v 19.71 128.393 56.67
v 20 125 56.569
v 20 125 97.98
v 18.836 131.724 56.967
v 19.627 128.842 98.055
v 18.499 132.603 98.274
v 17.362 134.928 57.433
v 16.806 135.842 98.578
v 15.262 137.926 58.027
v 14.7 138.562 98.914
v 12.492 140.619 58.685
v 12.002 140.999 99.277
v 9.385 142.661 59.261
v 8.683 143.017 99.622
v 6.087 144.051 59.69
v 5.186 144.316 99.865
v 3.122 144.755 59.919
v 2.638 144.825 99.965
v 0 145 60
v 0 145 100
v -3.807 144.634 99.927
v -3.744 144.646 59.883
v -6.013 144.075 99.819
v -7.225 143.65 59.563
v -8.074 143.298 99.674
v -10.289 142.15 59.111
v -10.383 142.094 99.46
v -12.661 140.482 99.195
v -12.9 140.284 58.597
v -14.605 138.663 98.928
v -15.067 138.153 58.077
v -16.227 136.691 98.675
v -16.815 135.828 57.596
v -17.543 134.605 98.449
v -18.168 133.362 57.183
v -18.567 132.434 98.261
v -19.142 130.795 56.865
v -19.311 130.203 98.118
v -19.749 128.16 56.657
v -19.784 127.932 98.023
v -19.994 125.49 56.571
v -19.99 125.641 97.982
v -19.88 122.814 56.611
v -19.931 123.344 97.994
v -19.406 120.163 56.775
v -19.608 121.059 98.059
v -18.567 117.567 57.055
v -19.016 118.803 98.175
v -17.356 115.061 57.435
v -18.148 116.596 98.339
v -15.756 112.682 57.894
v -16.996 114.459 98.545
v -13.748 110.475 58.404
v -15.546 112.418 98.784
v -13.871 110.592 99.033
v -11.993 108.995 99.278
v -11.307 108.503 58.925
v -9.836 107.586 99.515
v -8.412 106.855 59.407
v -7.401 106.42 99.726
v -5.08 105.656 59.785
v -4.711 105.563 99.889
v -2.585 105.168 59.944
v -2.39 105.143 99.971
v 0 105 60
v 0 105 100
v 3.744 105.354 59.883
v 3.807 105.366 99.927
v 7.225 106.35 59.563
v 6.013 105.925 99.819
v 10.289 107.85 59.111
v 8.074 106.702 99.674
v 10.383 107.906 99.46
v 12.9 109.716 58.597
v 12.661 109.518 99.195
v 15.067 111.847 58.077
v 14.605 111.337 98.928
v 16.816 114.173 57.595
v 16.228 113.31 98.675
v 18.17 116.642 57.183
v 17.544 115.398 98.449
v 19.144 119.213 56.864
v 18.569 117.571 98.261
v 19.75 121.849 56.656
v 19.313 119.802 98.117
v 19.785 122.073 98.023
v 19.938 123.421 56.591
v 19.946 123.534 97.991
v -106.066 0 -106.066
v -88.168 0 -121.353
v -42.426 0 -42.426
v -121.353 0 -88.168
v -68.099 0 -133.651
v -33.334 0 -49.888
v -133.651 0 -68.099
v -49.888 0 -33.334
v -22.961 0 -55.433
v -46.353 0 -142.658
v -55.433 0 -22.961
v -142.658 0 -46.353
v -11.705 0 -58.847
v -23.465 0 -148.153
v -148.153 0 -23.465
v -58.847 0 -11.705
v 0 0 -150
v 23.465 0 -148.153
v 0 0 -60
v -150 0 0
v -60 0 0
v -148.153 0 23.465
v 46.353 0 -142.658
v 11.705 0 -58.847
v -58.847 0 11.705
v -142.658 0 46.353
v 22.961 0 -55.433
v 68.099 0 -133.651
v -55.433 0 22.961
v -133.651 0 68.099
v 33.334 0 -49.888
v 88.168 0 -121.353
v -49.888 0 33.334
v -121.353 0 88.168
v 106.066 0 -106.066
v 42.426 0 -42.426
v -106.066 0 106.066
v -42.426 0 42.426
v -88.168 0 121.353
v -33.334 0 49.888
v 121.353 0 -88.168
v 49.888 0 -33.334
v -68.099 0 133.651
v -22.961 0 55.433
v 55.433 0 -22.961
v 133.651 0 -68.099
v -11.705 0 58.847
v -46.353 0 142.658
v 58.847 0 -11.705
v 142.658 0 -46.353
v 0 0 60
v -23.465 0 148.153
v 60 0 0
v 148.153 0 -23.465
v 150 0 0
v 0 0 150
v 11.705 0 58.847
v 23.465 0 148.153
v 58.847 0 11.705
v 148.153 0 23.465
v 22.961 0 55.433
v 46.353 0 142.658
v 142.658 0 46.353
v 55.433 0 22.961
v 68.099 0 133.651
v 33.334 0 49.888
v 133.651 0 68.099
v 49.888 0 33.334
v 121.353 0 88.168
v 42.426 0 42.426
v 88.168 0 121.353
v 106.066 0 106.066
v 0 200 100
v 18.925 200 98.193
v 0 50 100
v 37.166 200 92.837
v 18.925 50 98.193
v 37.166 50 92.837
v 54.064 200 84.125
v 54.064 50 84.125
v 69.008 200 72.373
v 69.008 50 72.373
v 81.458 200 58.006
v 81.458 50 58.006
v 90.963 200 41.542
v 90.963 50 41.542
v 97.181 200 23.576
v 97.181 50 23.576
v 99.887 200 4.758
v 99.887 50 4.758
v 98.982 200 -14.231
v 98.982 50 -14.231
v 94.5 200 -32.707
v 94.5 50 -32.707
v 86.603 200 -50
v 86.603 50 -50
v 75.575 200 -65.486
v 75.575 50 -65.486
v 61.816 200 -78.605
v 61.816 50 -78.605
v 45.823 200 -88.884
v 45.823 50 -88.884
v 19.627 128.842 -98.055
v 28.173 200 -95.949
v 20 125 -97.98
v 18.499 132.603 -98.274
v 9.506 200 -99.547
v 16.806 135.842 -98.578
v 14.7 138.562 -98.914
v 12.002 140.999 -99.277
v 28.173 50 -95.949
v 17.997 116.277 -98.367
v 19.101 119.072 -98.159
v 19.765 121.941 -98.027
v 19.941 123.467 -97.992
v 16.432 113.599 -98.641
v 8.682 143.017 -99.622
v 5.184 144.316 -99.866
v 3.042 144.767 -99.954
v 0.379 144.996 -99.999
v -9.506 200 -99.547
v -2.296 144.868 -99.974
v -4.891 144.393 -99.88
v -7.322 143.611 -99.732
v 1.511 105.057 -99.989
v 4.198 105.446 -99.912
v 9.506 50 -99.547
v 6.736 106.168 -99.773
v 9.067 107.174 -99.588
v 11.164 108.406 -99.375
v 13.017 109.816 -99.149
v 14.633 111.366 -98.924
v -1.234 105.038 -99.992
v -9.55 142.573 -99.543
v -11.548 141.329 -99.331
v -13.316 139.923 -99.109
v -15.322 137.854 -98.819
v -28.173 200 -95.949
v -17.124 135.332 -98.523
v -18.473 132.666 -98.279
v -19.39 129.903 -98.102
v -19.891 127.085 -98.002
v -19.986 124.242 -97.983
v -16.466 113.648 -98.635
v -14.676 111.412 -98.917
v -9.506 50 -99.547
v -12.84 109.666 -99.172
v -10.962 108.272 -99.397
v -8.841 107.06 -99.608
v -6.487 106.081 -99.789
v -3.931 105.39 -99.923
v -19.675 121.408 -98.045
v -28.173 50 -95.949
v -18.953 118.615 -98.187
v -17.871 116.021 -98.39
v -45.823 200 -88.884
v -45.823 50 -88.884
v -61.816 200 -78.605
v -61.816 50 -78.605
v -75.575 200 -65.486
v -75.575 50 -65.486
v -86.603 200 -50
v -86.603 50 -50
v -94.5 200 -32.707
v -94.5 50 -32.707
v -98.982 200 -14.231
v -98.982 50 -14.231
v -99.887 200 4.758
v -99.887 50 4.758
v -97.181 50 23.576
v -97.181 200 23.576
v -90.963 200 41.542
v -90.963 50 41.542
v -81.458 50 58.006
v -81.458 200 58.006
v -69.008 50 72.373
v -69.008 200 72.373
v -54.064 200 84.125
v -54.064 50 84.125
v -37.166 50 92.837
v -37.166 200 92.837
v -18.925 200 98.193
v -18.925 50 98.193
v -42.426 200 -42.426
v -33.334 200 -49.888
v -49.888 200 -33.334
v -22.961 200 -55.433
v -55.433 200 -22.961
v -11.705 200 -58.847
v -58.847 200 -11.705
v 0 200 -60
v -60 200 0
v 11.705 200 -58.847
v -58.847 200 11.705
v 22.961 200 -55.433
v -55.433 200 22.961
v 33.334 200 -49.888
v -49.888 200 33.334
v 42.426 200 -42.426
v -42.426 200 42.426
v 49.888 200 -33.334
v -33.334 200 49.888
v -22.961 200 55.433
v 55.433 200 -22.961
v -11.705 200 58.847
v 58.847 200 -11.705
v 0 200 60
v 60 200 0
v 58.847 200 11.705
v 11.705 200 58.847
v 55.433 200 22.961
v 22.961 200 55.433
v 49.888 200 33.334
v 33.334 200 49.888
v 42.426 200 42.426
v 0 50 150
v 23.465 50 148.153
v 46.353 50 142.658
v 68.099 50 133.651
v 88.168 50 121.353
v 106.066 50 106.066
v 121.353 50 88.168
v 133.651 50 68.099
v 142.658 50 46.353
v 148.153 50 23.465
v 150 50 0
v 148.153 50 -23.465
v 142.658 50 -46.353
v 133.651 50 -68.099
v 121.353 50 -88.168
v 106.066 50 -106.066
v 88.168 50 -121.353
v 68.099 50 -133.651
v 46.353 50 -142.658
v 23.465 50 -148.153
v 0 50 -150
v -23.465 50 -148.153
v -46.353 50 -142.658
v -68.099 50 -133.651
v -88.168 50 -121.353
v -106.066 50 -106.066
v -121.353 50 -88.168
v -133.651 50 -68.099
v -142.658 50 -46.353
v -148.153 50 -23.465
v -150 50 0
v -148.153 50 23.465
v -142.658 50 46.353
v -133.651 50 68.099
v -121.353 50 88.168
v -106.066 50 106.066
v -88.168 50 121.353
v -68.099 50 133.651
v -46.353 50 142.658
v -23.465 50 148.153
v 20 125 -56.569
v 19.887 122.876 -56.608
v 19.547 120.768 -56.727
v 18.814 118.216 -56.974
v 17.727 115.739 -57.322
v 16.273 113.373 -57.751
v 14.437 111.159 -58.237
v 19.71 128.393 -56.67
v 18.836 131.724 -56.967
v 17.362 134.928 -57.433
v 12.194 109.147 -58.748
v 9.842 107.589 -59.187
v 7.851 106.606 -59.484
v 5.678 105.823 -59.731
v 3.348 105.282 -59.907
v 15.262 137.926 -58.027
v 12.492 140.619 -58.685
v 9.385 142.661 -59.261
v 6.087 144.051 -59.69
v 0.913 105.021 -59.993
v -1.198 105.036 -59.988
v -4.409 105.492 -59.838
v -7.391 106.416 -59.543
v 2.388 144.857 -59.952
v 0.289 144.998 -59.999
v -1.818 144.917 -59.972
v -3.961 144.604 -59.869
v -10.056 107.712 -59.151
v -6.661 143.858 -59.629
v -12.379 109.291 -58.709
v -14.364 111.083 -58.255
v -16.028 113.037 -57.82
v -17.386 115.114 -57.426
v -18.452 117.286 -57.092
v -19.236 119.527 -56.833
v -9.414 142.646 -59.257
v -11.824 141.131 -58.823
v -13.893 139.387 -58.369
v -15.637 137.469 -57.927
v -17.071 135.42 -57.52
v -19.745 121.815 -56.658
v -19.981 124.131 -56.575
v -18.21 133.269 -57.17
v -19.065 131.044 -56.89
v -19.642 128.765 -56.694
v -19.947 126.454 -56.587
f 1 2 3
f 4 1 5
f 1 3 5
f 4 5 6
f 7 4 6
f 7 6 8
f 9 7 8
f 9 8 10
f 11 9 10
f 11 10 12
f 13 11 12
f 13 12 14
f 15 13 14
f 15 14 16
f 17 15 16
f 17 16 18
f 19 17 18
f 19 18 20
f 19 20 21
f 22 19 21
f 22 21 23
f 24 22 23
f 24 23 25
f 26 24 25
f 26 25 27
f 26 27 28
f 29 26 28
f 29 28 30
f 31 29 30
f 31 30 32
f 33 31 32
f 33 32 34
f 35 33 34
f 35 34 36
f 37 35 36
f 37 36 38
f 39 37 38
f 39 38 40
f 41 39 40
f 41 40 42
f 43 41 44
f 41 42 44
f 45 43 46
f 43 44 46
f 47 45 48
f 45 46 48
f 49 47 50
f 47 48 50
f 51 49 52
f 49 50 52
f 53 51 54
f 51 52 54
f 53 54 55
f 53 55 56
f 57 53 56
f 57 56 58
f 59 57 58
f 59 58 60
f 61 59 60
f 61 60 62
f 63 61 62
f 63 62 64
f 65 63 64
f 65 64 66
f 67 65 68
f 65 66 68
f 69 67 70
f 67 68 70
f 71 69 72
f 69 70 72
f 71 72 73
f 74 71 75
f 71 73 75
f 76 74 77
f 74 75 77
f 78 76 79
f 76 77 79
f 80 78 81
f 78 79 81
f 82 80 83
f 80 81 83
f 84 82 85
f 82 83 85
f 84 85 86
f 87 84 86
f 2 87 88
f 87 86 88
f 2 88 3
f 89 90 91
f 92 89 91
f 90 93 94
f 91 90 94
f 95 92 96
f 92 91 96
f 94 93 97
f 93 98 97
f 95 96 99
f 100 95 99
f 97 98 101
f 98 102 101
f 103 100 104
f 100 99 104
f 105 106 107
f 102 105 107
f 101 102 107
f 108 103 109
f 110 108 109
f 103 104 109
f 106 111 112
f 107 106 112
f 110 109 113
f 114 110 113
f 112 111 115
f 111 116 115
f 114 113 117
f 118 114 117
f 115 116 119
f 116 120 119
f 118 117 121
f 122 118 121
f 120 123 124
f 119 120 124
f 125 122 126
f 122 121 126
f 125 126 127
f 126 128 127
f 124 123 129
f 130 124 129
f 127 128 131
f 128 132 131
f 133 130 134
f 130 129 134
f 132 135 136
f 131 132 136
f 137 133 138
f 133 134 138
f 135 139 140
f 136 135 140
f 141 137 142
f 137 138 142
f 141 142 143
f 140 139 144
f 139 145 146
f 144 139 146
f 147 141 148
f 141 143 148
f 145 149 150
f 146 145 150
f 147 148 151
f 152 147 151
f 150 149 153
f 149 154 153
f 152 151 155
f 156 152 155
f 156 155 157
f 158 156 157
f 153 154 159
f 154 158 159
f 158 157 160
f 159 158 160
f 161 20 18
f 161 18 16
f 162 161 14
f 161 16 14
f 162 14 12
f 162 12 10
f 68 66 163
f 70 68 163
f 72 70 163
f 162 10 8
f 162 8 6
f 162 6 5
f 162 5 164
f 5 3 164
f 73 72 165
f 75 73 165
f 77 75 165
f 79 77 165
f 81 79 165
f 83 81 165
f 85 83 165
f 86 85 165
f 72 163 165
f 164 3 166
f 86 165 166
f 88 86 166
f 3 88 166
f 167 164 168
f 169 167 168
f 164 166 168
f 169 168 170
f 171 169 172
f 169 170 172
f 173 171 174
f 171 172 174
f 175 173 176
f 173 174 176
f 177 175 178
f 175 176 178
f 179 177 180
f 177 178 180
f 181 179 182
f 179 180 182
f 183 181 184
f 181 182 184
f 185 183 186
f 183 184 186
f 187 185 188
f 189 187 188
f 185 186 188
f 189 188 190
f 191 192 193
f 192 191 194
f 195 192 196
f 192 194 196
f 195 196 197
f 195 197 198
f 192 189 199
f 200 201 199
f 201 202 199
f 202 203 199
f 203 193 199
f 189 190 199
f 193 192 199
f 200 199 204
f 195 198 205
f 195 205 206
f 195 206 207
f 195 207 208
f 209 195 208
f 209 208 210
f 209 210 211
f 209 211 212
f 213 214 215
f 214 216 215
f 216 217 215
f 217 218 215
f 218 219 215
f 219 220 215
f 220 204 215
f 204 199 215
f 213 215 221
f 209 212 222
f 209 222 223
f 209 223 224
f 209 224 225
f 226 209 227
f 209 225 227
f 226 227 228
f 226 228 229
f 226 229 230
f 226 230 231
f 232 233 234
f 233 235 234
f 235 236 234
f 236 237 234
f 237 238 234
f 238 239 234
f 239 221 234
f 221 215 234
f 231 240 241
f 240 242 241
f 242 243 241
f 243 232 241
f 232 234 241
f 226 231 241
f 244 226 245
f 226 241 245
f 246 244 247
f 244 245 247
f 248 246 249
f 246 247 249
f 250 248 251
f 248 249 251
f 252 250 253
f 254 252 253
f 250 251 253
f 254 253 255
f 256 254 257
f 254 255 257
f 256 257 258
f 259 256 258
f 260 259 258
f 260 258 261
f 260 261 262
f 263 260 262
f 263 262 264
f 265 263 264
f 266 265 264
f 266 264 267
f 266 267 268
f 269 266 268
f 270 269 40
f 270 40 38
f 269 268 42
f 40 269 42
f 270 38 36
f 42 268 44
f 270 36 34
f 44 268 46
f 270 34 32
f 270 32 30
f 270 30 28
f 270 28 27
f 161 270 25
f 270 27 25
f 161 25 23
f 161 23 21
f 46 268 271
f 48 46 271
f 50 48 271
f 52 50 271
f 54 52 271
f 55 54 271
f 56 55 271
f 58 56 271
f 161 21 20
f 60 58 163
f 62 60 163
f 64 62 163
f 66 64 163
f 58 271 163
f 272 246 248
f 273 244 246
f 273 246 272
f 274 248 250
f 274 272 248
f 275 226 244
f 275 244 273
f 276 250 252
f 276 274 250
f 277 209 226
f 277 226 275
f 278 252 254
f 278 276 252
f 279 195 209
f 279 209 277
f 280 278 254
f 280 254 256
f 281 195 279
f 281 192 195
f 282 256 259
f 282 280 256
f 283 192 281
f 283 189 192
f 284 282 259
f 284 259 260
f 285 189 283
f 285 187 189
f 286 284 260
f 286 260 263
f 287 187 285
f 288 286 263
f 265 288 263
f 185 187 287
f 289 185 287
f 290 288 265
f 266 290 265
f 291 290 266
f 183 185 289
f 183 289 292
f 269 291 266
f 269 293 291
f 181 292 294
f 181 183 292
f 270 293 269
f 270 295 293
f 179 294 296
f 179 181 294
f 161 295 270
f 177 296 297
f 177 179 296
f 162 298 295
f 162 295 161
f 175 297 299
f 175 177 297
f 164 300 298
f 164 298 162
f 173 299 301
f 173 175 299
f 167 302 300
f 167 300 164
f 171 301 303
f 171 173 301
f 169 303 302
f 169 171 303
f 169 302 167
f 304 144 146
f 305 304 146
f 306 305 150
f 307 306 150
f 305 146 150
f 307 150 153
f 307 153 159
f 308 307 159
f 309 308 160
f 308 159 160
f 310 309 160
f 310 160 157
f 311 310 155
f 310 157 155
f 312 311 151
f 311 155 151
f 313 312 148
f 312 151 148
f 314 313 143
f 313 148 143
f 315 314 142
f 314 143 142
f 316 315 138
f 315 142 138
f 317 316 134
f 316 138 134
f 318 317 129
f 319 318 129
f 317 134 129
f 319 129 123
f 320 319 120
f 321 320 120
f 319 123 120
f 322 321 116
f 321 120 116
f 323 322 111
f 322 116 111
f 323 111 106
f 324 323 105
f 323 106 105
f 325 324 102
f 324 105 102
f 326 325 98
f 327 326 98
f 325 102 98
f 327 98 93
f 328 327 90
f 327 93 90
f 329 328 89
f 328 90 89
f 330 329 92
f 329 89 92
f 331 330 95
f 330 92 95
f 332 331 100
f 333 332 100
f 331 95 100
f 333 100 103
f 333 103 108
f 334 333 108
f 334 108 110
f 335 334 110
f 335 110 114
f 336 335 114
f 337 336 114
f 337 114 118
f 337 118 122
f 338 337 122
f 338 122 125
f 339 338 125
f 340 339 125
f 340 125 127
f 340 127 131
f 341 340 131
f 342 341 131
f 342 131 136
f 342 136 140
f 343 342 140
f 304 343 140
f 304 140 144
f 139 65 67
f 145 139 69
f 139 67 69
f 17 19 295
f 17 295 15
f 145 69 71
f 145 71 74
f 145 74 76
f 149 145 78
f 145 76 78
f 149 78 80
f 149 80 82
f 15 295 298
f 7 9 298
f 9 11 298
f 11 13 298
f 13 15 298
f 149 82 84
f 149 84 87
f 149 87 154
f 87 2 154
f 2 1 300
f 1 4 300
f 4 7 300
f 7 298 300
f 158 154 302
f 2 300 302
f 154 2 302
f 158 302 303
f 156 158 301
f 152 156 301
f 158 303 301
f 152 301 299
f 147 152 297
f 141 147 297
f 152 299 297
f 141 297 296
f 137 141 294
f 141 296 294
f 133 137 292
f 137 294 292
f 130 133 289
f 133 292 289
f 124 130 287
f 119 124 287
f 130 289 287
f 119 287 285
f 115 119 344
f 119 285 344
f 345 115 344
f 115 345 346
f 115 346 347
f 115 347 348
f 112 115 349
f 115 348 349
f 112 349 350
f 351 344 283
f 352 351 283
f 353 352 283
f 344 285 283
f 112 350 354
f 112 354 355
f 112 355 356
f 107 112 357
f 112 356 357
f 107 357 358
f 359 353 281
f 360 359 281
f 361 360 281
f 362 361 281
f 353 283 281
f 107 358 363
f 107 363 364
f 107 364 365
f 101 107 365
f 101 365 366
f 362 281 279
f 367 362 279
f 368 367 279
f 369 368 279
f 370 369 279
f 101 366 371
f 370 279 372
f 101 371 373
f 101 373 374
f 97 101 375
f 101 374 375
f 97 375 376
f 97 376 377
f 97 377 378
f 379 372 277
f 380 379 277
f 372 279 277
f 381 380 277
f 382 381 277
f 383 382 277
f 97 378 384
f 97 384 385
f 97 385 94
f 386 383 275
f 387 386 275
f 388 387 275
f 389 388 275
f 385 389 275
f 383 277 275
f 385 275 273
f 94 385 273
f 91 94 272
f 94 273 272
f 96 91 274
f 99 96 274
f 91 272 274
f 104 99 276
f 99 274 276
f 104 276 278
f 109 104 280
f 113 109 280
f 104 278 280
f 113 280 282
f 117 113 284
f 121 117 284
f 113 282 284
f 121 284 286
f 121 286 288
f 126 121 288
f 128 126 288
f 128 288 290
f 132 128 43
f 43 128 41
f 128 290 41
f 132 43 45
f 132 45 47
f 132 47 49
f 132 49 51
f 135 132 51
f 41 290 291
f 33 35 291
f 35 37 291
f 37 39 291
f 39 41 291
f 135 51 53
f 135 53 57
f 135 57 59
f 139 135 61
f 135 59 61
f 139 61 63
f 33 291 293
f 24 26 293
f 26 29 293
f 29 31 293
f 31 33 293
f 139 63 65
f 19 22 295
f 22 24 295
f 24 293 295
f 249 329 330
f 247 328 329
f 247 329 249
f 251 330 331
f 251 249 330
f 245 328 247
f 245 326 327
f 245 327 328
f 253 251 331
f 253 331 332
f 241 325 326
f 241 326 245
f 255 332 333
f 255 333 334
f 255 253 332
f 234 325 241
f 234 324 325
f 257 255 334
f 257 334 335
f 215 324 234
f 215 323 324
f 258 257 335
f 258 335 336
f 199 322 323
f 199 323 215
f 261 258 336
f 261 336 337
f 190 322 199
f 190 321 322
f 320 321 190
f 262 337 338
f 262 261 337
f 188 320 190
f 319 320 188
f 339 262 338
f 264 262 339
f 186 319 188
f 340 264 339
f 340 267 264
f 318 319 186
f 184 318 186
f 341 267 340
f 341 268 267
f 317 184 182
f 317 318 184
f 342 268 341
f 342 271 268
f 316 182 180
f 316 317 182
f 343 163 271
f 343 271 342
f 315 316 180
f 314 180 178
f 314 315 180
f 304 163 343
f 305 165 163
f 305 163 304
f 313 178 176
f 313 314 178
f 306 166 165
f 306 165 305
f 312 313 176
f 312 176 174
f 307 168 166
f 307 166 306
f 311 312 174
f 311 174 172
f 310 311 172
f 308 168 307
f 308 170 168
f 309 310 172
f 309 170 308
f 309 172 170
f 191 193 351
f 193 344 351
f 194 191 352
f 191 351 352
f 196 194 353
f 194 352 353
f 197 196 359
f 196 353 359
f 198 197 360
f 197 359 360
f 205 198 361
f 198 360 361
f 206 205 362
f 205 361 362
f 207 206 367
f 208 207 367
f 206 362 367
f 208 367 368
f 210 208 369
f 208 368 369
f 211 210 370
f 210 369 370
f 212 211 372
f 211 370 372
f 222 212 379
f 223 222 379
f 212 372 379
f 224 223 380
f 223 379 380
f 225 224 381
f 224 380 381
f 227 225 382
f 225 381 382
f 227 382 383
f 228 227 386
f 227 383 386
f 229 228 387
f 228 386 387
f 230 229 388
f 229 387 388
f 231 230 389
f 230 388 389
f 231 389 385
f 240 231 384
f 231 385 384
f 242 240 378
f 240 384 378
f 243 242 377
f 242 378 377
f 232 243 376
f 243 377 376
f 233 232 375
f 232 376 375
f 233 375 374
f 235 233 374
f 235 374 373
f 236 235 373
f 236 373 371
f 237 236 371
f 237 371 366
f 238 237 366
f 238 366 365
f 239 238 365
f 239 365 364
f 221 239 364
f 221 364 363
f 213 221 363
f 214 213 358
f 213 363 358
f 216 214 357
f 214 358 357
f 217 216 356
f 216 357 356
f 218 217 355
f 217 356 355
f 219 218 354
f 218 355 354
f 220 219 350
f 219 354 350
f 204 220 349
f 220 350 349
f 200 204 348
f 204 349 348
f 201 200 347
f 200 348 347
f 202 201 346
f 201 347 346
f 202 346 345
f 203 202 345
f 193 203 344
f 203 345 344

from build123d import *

# Parameters (mm, degrees)
IZIM1_R                     = 150
Y_KSEKLIK_EKSTR_ZYON2_DEPTH = 50
IZIM2_R                     = 100
Y_KSEKLIK_EKSTR_ZYON3_DEPTH = 150
IZIM3_R                     = 60
KES_EKSTR_ZYON1_DEPTH       = 292.547594742
IZIM4_R                     = 20
KES_EKSTR_ZYON2_DEPTH       = 130


with BuildPart() as part:
    # Çizim1 → Yükseklik-Ekstrüzyon2 (new body)
    with BuildSketch(Plane(origin=(0, 0, 0), x_dir=(1, 0, 0), z_dir=(0, 1, 0))):
        with Locations(Location((0, 0, 0), (0, 0, 270))):
            Circle(IZIM1_R)
    extrude(amount=Y_KSEKLIK_EKSTR_ZYON2_DEPTH)

    # Çizim2 → Yükseklik-Ekstrüzyon3 (add)
    with BuildSketch(Plane(origin=(0, 50, 0), x_dir=(1, 0, 0), z_dir=(0, 1, 0))):
        with Locations(Location((0, 0, 0), (0, 0, 270))):
            Circle(IZIM2_R)
    extrude(amount=Y_KSEKLIK_EKSTR_ZYON3_DEPTH)

    # Çizim3 → Kes-Ekstrüzyon1 (cut, through all)
    with BuildSketch(Plane(origin=(0, 200, 0), x_dir=(1, 0, 0), z_dir=(0, 1, 0))):
        with Locations(Location((0, 0, 0), (0, 0, 270))):
            Circle(IZIM3_R)
    extrude(amount=-KES_EKSTR_ZYON1_DEPTH, mode=Mode.SUBTRACT)

    # Çizim4 → Kes-Ekstrüzyon2 (cut, symmetric)
    with BuildSketch(Plane.XY):
        with Locations((0, 125)):
            Circle(IZIM4_R)
    extrude(amount=KES_EKSTR_ZYON2_DEPTH, both=True, mode=Mode.SUBTRACT)


solid = part.part
